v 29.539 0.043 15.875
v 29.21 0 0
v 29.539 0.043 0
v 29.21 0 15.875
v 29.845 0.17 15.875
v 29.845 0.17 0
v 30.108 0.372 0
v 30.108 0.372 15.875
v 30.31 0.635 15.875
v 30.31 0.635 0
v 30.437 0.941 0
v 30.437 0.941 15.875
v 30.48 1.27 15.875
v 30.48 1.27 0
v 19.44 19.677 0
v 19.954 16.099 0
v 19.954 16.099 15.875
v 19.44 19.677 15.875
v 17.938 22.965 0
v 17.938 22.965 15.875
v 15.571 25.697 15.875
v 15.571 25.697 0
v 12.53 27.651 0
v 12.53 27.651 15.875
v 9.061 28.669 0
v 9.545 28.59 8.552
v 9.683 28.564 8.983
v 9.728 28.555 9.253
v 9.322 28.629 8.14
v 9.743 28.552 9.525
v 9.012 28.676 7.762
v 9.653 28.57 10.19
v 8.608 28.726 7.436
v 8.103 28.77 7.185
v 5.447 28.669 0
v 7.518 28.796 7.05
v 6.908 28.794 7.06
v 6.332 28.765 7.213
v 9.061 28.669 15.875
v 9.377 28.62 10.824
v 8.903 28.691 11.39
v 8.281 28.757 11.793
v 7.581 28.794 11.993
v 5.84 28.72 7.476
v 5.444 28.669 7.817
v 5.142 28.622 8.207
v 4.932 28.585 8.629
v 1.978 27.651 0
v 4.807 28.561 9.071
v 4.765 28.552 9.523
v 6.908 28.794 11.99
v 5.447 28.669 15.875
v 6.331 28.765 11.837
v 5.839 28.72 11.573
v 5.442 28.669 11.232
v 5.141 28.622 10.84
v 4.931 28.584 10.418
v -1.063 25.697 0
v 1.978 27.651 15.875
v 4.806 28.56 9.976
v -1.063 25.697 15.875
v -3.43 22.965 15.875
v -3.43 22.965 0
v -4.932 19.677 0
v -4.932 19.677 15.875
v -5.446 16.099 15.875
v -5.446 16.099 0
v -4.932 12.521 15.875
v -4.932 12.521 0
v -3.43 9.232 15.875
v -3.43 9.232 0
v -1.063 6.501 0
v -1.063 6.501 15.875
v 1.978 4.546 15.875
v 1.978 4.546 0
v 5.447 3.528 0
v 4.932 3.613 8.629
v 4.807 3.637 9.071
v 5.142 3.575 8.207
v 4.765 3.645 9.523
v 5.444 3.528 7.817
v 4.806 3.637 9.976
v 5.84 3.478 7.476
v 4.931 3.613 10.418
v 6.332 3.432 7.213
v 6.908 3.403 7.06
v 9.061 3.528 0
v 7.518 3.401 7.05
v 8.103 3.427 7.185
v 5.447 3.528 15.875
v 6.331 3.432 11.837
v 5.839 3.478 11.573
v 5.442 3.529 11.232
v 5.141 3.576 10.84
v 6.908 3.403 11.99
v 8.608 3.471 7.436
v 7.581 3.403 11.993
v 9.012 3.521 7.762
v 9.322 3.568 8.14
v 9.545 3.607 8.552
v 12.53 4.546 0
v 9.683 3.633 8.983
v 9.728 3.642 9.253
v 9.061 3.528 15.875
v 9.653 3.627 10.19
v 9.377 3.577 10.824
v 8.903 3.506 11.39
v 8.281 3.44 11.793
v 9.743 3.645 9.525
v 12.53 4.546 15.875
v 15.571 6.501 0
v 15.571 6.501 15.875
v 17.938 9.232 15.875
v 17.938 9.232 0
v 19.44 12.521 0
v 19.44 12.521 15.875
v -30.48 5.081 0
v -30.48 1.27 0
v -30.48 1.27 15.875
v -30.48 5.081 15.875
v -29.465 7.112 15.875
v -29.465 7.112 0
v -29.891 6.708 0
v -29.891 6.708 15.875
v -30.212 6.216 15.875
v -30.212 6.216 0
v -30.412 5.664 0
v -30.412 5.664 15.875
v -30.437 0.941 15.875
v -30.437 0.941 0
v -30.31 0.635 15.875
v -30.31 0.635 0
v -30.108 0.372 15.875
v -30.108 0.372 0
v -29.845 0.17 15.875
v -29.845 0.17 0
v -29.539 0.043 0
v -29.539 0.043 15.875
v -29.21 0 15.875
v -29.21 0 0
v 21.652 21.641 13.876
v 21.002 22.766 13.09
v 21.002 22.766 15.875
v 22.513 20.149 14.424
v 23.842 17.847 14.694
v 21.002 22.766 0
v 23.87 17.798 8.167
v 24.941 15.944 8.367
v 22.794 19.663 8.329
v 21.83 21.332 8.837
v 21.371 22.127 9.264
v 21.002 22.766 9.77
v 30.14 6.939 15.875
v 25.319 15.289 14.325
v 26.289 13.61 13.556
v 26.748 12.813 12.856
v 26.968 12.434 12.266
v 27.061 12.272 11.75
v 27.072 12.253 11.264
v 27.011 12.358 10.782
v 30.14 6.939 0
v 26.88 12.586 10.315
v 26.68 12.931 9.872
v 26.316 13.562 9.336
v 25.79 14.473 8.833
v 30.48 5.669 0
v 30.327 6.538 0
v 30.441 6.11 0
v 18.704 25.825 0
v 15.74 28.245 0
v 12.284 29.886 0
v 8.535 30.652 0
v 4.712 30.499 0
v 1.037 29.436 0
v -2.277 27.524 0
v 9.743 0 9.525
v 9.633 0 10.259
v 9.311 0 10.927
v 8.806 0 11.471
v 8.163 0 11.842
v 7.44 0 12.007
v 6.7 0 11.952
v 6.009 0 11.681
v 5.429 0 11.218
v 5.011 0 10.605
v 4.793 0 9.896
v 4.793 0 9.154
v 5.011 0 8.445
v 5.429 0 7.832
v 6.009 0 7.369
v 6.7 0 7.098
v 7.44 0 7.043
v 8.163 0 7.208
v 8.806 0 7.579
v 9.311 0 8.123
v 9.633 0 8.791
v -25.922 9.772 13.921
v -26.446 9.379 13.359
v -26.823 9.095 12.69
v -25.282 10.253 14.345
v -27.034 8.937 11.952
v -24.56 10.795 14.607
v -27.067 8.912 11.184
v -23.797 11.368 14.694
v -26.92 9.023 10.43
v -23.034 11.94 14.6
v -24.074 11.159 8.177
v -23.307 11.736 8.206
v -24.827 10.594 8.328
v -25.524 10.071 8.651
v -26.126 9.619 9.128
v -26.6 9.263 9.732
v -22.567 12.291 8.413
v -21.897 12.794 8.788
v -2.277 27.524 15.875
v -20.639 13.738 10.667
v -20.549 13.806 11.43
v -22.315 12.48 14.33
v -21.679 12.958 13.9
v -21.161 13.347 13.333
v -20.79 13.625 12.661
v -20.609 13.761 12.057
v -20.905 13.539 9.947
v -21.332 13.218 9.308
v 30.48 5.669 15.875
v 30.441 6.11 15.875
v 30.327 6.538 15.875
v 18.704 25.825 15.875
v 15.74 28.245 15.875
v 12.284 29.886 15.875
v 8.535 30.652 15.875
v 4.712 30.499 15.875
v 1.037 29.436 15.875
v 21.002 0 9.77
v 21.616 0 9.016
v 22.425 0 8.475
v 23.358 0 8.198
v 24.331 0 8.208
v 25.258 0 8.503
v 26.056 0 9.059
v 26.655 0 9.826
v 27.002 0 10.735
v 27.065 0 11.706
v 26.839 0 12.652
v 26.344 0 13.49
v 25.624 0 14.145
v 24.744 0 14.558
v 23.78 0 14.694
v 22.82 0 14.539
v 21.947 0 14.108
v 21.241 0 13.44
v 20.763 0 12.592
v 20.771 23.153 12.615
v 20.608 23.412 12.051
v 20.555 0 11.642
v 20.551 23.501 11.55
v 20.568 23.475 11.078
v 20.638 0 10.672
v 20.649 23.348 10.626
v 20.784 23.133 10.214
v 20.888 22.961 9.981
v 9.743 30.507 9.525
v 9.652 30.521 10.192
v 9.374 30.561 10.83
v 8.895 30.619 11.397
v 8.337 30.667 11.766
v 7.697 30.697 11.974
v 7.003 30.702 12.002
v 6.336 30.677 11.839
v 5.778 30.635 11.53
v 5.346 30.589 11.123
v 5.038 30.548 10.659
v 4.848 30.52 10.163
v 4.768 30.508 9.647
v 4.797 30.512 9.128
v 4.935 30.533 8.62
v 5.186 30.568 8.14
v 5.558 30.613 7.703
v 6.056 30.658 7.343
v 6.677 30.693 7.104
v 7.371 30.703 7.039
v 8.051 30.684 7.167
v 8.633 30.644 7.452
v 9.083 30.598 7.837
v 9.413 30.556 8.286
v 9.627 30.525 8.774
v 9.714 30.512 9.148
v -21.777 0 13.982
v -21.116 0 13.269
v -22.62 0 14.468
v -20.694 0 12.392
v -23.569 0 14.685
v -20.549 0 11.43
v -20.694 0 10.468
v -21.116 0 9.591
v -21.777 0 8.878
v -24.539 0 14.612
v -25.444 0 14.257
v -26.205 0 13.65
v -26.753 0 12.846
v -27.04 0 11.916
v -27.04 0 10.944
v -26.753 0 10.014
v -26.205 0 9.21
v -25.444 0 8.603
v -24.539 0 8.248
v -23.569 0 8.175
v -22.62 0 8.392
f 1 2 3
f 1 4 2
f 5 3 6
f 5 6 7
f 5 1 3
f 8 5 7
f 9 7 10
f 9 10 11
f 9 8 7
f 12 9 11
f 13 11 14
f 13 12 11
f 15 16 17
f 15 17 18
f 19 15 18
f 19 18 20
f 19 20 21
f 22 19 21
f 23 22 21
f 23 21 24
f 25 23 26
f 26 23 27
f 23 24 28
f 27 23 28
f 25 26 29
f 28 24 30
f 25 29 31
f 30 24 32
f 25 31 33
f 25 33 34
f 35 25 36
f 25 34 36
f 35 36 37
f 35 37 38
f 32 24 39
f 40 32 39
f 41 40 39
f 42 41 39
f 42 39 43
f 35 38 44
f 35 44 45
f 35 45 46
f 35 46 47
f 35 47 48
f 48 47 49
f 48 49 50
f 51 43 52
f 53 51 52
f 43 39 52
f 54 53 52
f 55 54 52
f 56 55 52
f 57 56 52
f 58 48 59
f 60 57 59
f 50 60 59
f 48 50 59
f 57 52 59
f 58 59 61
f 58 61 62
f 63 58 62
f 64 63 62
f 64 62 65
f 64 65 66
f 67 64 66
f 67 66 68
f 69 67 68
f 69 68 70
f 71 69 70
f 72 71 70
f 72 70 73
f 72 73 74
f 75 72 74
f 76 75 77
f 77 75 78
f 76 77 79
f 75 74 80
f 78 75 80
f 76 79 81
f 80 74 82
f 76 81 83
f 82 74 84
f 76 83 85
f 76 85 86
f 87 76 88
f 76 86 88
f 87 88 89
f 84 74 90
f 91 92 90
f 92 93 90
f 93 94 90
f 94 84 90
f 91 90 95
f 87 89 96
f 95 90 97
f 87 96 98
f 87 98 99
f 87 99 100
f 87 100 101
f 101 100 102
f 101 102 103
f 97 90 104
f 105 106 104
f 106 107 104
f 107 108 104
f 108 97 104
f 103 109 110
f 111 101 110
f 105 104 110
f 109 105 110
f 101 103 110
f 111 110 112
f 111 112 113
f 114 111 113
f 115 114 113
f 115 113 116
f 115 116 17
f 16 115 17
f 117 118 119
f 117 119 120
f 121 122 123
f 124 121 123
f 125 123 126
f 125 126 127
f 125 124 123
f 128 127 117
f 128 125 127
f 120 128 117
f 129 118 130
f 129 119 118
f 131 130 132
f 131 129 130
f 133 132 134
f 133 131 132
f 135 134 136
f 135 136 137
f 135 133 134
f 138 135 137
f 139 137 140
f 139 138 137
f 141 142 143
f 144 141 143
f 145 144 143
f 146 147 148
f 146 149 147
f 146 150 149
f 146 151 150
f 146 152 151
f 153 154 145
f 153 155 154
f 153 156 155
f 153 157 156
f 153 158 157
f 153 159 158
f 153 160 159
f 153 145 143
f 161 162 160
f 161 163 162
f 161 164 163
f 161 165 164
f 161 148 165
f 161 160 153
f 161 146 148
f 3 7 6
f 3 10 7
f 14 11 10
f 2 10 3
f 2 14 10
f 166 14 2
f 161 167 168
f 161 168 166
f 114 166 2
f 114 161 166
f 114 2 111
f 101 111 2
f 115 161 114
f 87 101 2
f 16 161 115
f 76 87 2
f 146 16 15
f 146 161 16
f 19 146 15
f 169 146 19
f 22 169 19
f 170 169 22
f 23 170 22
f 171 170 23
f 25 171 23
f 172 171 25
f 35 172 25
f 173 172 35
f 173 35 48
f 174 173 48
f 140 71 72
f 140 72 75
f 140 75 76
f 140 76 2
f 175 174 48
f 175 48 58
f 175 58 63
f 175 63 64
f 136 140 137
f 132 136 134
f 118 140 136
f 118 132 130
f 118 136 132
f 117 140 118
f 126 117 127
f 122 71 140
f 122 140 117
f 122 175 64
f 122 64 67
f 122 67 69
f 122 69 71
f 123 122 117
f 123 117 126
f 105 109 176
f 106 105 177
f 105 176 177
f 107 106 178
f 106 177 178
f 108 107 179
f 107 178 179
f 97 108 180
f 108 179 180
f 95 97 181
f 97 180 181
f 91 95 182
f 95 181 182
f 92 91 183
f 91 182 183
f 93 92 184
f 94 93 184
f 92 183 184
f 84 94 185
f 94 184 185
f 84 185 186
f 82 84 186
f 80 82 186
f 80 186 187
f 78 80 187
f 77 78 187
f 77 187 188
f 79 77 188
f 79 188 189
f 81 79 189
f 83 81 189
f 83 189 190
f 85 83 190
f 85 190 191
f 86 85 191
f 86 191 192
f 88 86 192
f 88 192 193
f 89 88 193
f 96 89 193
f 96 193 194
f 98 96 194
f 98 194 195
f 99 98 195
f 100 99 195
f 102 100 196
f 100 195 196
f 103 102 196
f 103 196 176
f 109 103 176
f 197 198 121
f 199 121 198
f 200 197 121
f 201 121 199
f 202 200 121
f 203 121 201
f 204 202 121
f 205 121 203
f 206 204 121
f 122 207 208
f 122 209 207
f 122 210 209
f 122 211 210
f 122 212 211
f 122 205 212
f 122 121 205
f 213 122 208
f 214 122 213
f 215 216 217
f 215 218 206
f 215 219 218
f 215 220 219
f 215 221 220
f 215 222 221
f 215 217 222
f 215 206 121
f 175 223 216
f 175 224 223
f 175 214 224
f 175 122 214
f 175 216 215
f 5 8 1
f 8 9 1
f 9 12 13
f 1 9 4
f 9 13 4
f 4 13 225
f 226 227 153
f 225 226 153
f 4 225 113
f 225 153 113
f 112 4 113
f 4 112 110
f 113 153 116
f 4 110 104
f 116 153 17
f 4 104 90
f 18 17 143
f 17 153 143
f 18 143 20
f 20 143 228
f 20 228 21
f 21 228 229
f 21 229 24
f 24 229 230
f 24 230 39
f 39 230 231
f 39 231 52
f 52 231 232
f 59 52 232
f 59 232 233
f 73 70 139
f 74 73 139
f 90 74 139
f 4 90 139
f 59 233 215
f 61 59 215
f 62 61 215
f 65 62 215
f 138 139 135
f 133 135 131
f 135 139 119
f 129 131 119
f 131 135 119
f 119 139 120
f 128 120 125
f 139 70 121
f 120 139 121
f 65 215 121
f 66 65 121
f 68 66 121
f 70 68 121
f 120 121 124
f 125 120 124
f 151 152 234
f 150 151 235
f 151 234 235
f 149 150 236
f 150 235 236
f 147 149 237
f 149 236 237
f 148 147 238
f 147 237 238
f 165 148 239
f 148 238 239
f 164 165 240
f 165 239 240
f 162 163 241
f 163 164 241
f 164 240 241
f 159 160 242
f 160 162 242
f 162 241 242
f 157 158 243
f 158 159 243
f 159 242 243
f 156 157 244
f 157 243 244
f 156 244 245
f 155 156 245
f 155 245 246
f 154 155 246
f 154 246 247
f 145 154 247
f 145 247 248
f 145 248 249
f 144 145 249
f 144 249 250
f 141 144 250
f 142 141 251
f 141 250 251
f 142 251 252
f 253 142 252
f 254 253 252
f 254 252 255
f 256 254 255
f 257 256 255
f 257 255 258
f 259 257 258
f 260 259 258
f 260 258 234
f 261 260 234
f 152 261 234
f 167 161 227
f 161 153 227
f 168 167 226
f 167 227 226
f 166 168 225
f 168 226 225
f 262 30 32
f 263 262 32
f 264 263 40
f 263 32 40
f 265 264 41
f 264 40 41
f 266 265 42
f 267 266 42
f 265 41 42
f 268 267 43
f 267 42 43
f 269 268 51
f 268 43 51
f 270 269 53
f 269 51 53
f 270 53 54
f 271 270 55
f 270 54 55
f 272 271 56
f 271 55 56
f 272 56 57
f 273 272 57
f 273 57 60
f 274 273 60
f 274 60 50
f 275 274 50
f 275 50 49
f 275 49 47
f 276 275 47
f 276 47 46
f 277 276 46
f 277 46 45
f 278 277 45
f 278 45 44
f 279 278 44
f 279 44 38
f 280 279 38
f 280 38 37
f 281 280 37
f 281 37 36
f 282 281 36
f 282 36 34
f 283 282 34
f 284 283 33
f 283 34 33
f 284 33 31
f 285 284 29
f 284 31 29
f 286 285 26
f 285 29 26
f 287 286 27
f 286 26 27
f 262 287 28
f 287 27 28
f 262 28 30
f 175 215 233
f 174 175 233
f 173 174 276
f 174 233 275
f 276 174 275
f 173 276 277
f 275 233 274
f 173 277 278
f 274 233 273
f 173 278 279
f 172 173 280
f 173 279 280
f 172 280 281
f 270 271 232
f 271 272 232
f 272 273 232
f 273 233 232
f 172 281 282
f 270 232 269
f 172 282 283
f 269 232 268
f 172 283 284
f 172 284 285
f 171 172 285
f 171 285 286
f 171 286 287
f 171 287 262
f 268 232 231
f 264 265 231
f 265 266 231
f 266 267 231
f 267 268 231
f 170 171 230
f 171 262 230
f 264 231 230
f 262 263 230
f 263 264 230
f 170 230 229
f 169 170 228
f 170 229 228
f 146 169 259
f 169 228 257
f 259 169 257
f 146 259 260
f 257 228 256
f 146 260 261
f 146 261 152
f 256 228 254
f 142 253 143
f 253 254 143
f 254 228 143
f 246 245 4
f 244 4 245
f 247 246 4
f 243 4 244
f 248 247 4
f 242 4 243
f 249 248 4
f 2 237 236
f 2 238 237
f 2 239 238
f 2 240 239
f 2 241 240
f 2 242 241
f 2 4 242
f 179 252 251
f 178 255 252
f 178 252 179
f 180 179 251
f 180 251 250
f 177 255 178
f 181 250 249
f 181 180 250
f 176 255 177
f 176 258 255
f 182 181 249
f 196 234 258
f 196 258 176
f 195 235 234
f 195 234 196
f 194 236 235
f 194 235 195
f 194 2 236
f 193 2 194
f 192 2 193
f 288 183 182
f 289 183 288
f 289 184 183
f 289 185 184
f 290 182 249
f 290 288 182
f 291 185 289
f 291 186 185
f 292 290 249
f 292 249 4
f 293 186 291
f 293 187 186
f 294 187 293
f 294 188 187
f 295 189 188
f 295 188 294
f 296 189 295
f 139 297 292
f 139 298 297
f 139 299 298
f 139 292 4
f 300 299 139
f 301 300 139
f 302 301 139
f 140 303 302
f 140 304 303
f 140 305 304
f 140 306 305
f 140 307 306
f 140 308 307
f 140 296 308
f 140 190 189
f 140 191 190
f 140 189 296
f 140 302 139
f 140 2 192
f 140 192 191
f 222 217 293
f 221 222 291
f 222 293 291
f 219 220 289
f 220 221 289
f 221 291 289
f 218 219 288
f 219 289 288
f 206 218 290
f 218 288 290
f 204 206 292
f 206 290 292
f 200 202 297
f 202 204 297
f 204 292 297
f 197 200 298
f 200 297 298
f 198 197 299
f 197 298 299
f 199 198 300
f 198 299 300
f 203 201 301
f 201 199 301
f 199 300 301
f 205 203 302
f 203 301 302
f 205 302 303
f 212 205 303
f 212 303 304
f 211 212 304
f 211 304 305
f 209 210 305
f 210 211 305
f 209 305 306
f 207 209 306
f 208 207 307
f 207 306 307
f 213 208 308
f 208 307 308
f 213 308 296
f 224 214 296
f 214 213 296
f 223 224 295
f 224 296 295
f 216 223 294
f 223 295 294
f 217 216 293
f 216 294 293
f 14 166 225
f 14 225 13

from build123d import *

# Parameters (mm, degrees)
SALIENTE_EXTRUIR1_DEPTH = 15.875
REDONDEO1_R             = 15.875
CORTAR_EXTRUIR1_REACH   = 48.084
CROQUIS2_R              = 9.525
CROQUIS3_R              = 12.7
CORTAR_EXTRUIR2_DEPTH   = 47.084243503
CROQUIS4_R              = 3.2639
CROQUIS4_R_2            = 2.4892
CORTAR_EXTRUIR3_DEPTH   = 47.084243503
REDONDEO2_R             = 2.54
REDONDEO3_R             = 1.27


with BuildPart() as part:
    # Croquis1 → Saliente-Extruir1 (new body)
    with BuildSketch(Plane.XY):
        Polygon((30.48, 0), (-30.48, 0), (-30.48, 6.35), (12.046472996, 38.277805334), (30.48, 6.35), align=None)
    extrude(amount=SALIENTE_EXTRUIR1_DEPTH)

    # Redondeo1
    redondeo1_edges = [part.edges().sort_by_distance(p)[0] for p in [
        (12.046472996, 38.277805334, 7.9375),
    ]]
    fillet(redondeo1_edges, radius=REDONDEO1_R)

    # Croquis2 → Cortar-Extruir1 (cut, up to next)
    with BuildSketch(Plane.XY.offset(15.875), mode=Mode.PRIVATE) as cortar_extruir1_sk1:
        with Locations((7.254003, 16.09860686)):
            Circle(CROQUIS2_R)
    cortar_extruir1_tool1 = extrude(cortar_extruir1_sk1.sketch, amount=-CORTAR_EXTRUIR1_REACH, mode=Mode.PRIVATE) & part.part
    add(cortar_extruir1_tool1.solids().sort_by_distance((7.254003, 16.098607, 15.875))[0], mode=Mode.SUBTRACT)

    # Croquis3 → Cortar-Extruir2 (cut, through all)
    with BuildSketch(Plane.XY.offset(15.875)):
        with Locations((7.254003, 16.09860686)):
            Circle(CROQUIS3_R)
    extrude(amount=-CORTAR_EXTRUIR2_DEPTH, mode=Mode.SUBTRACT)

    # Croquis4 → Cortar-Extruir3 (cut, through all)
    with BuildSketch(Plane.XZ):
        with Locations((-23.8125, 11.43)):
            Circle(CROQUIS4_R)
        with Locations(Location((23.8125, 11.43, 0), (0, 0, 210.56660833))):
            Circle(CROQUIS4_R)
        with Locations((7.254003, 9.525)):
            Circle(CROQUIS4_R_2)
    extrude(amount=-CORTAR_EXTRUIR3_DEPTH, mode=Mode.SUBTRACT)

    # Redondeo2
    redondeo2_edges = [part.edges().sort_by_distance(p)[0] for p in [
        (-30.48, 6.35, 7.9375),
        (30.48, 6.35, 7.9375),
    ]]
    fillet(redondeo2_edges, radius=REDONDEO2_R)

    # Redondeo3
    redondeo3_edges = [part.edges().sort_by_distance(p)[0] for p in [
        (30.48, 0, 7.9375),
        (-30.48, 0, 7.9375),
    ]]
    fillet(redondeo3_edges, radius=REDONDEO3_R)


solid = part.part
